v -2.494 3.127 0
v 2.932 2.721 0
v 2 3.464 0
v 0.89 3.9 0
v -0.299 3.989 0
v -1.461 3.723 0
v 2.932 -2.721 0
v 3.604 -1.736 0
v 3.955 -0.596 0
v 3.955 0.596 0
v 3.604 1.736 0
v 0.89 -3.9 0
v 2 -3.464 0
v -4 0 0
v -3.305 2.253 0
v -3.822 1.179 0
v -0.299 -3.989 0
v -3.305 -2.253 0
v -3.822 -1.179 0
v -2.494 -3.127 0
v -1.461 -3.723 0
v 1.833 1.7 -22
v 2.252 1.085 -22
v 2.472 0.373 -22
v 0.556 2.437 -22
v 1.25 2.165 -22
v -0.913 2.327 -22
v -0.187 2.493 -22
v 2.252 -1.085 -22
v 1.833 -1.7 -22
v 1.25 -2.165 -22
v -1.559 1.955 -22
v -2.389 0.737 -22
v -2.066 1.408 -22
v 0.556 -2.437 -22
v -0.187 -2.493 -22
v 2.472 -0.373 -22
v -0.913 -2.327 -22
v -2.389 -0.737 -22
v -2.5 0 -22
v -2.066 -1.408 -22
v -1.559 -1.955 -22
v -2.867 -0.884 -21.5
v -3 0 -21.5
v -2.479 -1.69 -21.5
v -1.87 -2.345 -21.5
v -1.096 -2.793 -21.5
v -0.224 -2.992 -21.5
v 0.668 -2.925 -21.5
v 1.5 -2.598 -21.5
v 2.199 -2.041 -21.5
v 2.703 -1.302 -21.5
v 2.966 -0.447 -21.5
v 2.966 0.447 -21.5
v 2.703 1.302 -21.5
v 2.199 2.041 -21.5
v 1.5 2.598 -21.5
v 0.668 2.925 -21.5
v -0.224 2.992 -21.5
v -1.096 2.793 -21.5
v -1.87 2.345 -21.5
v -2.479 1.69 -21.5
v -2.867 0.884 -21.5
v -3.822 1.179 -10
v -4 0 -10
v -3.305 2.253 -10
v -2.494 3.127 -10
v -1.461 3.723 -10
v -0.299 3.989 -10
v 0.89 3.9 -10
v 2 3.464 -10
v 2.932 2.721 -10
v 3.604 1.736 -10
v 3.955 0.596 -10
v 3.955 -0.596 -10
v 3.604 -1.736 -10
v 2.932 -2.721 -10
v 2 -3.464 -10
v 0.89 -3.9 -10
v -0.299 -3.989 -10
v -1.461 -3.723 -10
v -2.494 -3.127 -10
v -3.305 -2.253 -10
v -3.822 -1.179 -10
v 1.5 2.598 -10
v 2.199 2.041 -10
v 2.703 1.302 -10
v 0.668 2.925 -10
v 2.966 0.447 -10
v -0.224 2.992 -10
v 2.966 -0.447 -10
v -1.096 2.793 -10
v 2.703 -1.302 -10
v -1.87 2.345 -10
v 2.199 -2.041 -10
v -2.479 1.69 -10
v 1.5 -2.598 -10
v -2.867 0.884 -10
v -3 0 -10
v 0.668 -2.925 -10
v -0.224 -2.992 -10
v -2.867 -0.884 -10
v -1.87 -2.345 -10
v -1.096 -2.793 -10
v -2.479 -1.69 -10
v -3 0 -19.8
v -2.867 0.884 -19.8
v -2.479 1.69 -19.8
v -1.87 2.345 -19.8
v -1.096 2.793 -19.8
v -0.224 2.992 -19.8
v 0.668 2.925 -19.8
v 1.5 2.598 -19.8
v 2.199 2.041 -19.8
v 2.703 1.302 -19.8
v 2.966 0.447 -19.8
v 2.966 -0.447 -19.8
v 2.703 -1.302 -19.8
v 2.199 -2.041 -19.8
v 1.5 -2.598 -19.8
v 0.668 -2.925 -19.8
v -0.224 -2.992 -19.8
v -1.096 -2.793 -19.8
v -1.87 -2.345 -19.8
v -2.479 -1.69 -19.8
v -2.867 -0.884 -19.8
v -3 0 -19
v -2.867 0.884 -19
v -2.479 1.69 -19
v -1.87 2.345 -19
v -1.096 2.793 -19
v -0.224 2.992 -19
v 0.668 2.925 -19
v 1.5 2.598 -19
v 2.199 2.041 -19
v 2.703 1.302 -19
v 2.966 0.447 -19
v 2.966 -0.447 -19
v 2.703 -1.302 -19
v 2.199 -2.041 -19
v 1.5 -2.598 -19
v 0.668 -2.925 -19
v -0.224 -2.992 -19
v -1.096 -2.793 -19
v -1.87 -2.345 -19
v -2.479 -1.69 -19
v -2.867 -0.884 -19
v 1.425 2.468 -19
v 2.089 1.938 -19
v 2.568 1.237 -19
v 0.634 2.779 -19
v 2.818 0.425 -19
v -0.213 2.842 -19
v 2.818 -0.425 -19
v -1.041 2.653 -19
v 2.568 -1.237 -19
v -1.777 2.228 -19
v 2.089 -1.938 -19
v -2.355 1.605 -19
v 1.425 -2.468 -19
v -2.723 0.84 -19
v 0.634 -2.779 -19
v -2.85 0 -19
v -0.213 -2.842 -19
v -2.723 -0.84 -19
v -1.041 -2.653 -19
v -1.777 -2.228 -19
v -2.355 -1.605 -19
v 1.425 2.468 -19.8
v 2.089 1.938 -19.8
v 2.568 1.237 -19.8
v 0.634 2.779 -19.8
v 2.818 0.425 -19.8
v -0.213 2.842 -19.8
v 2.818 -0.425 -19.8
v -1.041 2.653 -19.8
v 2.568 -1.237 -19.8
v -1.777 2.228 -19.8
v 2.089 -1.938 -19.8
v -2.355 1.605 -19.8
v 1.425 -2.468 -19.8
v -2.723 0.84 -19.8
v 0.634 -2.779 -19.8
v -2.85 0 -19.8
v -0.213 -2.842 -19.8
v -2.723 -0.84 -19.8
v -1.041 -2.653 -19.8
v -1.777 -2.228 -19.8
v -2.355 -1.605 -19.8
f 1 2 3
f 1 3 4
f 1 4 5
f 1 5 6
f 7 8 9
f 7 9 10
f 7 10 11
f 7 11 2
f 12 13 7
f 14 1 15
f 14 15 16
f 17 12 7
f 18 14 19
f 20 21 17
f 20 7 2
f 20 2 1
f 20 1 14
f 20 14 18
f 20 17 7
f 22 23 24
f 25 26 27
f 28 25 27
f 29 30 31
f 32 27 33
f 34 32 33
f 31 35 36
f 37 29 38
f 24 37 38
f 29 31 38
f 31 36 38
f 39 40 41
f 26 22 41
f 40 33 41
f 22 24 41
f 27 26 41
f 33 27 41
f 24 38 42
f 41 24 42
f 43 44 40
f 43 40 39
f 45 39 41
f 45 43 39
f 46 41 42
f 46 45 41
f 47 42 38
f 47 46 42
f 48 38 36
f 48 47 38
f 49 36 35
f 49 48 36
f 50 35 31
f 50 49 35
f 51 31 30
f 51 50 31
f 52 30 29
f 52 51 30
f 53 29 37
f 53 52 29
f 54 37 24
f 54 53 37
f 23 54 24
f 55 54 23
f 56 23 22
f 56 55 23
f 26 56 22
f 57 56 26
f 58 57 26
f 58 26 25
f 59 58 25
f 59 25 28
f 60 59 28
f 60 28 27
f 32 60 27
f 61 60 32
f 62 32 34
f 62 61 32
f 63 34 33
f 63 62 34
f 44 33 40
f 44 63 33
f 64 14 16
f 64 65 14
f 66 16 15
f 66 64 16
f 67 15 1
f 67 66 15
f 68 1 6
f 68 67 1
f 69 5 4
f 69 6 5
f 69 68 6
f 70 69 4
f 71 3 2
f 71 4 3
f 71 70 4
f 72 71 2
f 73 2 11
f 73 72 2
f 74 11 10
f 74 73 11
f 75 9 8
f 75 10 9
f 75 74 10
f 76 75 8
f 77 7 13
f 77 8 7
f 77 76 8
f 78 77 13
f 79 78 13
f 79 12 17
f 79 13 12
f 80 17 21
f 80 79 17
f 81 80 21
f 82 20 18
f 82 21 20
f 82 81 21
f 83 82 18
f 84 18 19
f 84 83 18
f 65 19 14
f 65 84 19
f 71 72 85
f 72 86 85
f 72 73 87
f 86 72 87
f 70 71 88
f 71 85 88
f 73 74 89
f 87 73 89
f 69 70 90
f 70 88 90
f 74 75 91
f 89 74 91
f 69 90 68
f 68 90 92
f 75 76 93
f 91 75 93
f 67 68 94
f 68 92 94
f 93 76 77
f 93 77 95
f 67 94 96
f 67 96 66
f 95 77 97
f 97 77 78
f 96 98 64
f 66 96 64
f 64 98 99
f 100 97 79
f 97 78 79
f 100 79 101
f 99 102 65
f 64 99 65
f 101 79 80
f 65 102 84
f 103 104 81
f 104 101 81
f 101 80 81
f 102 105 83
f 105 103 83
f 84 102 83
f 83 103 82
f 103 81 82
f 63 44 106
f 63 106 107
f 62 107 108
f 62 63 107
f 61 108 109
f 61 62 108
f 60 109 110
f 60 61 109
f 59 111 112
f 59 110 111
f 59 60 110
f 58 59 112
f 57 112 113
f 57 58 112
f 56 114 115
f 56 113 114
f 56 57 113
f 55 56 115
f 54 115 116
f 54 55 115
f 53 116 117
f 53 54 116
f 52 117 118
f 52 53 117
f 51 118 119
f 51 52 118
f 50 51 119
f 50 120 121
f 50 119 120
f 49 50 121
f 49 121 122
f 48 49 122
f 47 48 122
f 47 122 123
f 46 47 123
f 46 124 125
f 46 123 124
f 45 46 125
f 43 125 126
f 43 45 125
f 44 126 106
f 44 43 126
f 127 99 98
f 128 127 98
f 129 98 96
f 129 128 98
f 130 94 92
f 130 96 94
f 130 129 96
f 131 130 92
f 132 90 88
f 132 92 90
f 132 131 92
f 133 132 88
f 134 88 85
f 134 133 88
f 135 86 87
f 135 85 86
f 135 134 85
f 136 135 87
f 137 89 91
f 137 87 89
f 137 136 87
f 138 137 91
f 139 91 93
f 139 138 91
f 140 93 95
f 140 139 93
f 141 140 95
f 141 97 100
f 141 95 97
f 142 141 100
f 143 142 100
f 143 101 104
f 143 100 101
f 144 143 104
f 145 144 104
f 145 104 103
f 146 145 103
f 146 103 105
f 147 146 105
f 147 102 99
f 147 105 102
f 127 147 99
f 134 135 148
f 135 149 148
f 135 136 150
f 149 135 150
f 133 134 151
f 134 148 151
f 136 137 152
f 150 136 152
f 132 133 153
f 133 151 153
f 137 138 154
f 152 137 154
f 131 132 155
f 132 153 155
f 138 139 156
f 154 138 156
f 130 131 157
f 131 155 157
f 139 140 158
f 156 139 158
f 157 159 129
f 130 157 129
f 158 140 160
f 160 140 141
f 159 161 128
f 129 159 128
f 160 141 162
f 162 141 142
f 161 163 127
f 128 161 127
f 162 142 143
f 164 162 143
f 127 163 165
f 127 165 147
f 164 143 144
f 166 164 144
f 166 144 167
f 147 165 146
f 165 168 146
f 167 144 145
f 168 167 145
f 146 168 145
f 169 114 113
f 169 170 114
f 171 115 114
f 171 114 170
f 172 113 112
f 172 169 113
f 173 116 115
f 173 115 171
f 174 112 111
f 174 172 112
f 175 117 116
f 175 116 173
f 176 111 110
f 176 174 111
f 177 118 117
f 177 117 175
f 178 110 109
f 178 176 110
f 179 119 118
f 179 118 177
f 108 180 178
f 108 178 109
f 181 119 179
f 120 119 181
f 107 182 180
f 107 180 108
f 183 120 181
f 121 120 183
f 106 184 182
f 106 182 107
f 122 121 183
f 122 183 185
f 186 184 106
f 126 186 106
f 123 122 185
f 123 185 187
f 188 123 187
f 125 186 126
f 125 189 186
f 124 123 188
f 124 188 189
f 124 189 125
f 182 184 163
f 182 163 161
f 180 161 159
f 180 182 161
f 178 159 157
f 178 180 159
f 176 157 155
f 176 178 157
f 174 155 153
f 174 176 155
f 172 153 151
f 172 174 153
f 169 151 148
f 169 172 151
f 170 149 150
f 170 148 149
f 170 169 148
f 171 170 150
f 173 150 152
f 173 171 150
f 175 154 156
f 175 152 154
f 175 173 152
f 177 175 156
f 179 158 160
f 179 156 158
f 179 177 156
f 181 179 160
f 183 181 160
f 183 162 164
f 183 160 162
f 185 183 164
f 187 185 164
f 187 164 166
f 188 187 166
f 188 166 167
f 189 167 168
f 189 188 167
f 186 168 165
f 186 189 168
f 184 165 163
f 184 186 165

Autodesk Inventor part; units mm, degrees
ref_plane "YZ Plane" through (0, 0, 0) normal (1, 0, 0) x (0, 1, 0)
ref_plane "XZ Plane" through (0, 0, 0) normal (0, 1, 0) x (-1, 0, 0)
ref_plane "XY Plane" through (0, 0, 0) normal (0, 0, 1) x (1, 0, 0)
sketch "Skizze1" plane through (0, 0, 0) normal (0, 1, 0) x (-1, 0, 0)
  line L0 (0, 0) -> (4, 0)
  line L1 (4, 0) -> (4, -10)
  line L2 (4, -10) -> (3, -10)
  line L3 (3, -10) -> (3, -19)
  line L4 (3, -19) -> (2.85, -19)
  line L5 (2.85, -19) -> (2.85, -19.8)
  line L6 (2.85, -19.8) -> (3, -19.8)
  line L7 (3, -19.8) -> (3, -22)
  line L8 (3, -22) -> (0, -22)
  line L9 (0, -22) -> (0, 0)
  point P0 (1.5, -22)
  dimension "d0" = 10
  dimension "d1" = 22
  dimension "d3" = 9
  dimension "d4" = 0.8
  dimension "d5" = 8
  dimension "d6" = 6
  dimension "d7" = 5.7
revolve "Umdrehung1" add sketch "Skizze1" angle 360 about axis through (0, 0, -22) along (0, 0, 1)
chamfer "Fasen1" distance 0.5 angle 45 1 edges at (3, 0, -22)
properties part number "Achse.planetenrad"
